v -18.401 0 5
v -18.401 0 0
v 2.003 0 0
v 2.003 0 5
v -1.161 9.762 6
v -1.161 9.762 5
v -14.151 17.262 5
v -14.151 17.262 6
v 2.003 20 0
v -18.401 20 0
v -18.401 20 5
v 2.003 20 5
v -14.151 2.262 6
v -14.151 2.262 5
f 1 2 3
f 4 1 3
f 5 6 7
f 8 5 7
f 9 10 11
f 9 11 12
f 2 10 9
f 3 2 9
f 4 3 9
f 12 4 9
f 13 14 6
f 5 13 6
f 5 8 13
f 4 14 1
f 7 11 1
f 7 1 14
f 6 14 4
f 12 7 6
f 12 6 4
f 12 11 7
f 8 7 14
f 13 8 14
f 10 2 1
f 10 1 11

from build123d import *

# Parameters (mm, degrees)
F1_DEPTH = 6
F0_W     = 20.403712
F0_H     = 20
F2_DEPTH = 5


with BuildPart() as f1:
    # F0 (on Top) → F1 (new body)
    with BuildSketch(Plane.XY):
        Polygon((-1.160592, 9.762301), (-14.150973, 17.262301), (-14.150973, 2.262301), align=None)
    extrude(amount=F1_DEPTH)

    # F0 (on Top) → F2 (join)
    with BuildSketch(Plane.XY):
        with Locations((-8.199221, 10)):
            Rectangle(F0_W, F0_H)
        Polygon((-14.150973, 2.262301), (-14.150973, 17.262301), (-1.160592, 9.762301), align=None, mode=Mode.SUBTRACT)
    extrude(amount=F2_DEPTH)


solid = f1.part
